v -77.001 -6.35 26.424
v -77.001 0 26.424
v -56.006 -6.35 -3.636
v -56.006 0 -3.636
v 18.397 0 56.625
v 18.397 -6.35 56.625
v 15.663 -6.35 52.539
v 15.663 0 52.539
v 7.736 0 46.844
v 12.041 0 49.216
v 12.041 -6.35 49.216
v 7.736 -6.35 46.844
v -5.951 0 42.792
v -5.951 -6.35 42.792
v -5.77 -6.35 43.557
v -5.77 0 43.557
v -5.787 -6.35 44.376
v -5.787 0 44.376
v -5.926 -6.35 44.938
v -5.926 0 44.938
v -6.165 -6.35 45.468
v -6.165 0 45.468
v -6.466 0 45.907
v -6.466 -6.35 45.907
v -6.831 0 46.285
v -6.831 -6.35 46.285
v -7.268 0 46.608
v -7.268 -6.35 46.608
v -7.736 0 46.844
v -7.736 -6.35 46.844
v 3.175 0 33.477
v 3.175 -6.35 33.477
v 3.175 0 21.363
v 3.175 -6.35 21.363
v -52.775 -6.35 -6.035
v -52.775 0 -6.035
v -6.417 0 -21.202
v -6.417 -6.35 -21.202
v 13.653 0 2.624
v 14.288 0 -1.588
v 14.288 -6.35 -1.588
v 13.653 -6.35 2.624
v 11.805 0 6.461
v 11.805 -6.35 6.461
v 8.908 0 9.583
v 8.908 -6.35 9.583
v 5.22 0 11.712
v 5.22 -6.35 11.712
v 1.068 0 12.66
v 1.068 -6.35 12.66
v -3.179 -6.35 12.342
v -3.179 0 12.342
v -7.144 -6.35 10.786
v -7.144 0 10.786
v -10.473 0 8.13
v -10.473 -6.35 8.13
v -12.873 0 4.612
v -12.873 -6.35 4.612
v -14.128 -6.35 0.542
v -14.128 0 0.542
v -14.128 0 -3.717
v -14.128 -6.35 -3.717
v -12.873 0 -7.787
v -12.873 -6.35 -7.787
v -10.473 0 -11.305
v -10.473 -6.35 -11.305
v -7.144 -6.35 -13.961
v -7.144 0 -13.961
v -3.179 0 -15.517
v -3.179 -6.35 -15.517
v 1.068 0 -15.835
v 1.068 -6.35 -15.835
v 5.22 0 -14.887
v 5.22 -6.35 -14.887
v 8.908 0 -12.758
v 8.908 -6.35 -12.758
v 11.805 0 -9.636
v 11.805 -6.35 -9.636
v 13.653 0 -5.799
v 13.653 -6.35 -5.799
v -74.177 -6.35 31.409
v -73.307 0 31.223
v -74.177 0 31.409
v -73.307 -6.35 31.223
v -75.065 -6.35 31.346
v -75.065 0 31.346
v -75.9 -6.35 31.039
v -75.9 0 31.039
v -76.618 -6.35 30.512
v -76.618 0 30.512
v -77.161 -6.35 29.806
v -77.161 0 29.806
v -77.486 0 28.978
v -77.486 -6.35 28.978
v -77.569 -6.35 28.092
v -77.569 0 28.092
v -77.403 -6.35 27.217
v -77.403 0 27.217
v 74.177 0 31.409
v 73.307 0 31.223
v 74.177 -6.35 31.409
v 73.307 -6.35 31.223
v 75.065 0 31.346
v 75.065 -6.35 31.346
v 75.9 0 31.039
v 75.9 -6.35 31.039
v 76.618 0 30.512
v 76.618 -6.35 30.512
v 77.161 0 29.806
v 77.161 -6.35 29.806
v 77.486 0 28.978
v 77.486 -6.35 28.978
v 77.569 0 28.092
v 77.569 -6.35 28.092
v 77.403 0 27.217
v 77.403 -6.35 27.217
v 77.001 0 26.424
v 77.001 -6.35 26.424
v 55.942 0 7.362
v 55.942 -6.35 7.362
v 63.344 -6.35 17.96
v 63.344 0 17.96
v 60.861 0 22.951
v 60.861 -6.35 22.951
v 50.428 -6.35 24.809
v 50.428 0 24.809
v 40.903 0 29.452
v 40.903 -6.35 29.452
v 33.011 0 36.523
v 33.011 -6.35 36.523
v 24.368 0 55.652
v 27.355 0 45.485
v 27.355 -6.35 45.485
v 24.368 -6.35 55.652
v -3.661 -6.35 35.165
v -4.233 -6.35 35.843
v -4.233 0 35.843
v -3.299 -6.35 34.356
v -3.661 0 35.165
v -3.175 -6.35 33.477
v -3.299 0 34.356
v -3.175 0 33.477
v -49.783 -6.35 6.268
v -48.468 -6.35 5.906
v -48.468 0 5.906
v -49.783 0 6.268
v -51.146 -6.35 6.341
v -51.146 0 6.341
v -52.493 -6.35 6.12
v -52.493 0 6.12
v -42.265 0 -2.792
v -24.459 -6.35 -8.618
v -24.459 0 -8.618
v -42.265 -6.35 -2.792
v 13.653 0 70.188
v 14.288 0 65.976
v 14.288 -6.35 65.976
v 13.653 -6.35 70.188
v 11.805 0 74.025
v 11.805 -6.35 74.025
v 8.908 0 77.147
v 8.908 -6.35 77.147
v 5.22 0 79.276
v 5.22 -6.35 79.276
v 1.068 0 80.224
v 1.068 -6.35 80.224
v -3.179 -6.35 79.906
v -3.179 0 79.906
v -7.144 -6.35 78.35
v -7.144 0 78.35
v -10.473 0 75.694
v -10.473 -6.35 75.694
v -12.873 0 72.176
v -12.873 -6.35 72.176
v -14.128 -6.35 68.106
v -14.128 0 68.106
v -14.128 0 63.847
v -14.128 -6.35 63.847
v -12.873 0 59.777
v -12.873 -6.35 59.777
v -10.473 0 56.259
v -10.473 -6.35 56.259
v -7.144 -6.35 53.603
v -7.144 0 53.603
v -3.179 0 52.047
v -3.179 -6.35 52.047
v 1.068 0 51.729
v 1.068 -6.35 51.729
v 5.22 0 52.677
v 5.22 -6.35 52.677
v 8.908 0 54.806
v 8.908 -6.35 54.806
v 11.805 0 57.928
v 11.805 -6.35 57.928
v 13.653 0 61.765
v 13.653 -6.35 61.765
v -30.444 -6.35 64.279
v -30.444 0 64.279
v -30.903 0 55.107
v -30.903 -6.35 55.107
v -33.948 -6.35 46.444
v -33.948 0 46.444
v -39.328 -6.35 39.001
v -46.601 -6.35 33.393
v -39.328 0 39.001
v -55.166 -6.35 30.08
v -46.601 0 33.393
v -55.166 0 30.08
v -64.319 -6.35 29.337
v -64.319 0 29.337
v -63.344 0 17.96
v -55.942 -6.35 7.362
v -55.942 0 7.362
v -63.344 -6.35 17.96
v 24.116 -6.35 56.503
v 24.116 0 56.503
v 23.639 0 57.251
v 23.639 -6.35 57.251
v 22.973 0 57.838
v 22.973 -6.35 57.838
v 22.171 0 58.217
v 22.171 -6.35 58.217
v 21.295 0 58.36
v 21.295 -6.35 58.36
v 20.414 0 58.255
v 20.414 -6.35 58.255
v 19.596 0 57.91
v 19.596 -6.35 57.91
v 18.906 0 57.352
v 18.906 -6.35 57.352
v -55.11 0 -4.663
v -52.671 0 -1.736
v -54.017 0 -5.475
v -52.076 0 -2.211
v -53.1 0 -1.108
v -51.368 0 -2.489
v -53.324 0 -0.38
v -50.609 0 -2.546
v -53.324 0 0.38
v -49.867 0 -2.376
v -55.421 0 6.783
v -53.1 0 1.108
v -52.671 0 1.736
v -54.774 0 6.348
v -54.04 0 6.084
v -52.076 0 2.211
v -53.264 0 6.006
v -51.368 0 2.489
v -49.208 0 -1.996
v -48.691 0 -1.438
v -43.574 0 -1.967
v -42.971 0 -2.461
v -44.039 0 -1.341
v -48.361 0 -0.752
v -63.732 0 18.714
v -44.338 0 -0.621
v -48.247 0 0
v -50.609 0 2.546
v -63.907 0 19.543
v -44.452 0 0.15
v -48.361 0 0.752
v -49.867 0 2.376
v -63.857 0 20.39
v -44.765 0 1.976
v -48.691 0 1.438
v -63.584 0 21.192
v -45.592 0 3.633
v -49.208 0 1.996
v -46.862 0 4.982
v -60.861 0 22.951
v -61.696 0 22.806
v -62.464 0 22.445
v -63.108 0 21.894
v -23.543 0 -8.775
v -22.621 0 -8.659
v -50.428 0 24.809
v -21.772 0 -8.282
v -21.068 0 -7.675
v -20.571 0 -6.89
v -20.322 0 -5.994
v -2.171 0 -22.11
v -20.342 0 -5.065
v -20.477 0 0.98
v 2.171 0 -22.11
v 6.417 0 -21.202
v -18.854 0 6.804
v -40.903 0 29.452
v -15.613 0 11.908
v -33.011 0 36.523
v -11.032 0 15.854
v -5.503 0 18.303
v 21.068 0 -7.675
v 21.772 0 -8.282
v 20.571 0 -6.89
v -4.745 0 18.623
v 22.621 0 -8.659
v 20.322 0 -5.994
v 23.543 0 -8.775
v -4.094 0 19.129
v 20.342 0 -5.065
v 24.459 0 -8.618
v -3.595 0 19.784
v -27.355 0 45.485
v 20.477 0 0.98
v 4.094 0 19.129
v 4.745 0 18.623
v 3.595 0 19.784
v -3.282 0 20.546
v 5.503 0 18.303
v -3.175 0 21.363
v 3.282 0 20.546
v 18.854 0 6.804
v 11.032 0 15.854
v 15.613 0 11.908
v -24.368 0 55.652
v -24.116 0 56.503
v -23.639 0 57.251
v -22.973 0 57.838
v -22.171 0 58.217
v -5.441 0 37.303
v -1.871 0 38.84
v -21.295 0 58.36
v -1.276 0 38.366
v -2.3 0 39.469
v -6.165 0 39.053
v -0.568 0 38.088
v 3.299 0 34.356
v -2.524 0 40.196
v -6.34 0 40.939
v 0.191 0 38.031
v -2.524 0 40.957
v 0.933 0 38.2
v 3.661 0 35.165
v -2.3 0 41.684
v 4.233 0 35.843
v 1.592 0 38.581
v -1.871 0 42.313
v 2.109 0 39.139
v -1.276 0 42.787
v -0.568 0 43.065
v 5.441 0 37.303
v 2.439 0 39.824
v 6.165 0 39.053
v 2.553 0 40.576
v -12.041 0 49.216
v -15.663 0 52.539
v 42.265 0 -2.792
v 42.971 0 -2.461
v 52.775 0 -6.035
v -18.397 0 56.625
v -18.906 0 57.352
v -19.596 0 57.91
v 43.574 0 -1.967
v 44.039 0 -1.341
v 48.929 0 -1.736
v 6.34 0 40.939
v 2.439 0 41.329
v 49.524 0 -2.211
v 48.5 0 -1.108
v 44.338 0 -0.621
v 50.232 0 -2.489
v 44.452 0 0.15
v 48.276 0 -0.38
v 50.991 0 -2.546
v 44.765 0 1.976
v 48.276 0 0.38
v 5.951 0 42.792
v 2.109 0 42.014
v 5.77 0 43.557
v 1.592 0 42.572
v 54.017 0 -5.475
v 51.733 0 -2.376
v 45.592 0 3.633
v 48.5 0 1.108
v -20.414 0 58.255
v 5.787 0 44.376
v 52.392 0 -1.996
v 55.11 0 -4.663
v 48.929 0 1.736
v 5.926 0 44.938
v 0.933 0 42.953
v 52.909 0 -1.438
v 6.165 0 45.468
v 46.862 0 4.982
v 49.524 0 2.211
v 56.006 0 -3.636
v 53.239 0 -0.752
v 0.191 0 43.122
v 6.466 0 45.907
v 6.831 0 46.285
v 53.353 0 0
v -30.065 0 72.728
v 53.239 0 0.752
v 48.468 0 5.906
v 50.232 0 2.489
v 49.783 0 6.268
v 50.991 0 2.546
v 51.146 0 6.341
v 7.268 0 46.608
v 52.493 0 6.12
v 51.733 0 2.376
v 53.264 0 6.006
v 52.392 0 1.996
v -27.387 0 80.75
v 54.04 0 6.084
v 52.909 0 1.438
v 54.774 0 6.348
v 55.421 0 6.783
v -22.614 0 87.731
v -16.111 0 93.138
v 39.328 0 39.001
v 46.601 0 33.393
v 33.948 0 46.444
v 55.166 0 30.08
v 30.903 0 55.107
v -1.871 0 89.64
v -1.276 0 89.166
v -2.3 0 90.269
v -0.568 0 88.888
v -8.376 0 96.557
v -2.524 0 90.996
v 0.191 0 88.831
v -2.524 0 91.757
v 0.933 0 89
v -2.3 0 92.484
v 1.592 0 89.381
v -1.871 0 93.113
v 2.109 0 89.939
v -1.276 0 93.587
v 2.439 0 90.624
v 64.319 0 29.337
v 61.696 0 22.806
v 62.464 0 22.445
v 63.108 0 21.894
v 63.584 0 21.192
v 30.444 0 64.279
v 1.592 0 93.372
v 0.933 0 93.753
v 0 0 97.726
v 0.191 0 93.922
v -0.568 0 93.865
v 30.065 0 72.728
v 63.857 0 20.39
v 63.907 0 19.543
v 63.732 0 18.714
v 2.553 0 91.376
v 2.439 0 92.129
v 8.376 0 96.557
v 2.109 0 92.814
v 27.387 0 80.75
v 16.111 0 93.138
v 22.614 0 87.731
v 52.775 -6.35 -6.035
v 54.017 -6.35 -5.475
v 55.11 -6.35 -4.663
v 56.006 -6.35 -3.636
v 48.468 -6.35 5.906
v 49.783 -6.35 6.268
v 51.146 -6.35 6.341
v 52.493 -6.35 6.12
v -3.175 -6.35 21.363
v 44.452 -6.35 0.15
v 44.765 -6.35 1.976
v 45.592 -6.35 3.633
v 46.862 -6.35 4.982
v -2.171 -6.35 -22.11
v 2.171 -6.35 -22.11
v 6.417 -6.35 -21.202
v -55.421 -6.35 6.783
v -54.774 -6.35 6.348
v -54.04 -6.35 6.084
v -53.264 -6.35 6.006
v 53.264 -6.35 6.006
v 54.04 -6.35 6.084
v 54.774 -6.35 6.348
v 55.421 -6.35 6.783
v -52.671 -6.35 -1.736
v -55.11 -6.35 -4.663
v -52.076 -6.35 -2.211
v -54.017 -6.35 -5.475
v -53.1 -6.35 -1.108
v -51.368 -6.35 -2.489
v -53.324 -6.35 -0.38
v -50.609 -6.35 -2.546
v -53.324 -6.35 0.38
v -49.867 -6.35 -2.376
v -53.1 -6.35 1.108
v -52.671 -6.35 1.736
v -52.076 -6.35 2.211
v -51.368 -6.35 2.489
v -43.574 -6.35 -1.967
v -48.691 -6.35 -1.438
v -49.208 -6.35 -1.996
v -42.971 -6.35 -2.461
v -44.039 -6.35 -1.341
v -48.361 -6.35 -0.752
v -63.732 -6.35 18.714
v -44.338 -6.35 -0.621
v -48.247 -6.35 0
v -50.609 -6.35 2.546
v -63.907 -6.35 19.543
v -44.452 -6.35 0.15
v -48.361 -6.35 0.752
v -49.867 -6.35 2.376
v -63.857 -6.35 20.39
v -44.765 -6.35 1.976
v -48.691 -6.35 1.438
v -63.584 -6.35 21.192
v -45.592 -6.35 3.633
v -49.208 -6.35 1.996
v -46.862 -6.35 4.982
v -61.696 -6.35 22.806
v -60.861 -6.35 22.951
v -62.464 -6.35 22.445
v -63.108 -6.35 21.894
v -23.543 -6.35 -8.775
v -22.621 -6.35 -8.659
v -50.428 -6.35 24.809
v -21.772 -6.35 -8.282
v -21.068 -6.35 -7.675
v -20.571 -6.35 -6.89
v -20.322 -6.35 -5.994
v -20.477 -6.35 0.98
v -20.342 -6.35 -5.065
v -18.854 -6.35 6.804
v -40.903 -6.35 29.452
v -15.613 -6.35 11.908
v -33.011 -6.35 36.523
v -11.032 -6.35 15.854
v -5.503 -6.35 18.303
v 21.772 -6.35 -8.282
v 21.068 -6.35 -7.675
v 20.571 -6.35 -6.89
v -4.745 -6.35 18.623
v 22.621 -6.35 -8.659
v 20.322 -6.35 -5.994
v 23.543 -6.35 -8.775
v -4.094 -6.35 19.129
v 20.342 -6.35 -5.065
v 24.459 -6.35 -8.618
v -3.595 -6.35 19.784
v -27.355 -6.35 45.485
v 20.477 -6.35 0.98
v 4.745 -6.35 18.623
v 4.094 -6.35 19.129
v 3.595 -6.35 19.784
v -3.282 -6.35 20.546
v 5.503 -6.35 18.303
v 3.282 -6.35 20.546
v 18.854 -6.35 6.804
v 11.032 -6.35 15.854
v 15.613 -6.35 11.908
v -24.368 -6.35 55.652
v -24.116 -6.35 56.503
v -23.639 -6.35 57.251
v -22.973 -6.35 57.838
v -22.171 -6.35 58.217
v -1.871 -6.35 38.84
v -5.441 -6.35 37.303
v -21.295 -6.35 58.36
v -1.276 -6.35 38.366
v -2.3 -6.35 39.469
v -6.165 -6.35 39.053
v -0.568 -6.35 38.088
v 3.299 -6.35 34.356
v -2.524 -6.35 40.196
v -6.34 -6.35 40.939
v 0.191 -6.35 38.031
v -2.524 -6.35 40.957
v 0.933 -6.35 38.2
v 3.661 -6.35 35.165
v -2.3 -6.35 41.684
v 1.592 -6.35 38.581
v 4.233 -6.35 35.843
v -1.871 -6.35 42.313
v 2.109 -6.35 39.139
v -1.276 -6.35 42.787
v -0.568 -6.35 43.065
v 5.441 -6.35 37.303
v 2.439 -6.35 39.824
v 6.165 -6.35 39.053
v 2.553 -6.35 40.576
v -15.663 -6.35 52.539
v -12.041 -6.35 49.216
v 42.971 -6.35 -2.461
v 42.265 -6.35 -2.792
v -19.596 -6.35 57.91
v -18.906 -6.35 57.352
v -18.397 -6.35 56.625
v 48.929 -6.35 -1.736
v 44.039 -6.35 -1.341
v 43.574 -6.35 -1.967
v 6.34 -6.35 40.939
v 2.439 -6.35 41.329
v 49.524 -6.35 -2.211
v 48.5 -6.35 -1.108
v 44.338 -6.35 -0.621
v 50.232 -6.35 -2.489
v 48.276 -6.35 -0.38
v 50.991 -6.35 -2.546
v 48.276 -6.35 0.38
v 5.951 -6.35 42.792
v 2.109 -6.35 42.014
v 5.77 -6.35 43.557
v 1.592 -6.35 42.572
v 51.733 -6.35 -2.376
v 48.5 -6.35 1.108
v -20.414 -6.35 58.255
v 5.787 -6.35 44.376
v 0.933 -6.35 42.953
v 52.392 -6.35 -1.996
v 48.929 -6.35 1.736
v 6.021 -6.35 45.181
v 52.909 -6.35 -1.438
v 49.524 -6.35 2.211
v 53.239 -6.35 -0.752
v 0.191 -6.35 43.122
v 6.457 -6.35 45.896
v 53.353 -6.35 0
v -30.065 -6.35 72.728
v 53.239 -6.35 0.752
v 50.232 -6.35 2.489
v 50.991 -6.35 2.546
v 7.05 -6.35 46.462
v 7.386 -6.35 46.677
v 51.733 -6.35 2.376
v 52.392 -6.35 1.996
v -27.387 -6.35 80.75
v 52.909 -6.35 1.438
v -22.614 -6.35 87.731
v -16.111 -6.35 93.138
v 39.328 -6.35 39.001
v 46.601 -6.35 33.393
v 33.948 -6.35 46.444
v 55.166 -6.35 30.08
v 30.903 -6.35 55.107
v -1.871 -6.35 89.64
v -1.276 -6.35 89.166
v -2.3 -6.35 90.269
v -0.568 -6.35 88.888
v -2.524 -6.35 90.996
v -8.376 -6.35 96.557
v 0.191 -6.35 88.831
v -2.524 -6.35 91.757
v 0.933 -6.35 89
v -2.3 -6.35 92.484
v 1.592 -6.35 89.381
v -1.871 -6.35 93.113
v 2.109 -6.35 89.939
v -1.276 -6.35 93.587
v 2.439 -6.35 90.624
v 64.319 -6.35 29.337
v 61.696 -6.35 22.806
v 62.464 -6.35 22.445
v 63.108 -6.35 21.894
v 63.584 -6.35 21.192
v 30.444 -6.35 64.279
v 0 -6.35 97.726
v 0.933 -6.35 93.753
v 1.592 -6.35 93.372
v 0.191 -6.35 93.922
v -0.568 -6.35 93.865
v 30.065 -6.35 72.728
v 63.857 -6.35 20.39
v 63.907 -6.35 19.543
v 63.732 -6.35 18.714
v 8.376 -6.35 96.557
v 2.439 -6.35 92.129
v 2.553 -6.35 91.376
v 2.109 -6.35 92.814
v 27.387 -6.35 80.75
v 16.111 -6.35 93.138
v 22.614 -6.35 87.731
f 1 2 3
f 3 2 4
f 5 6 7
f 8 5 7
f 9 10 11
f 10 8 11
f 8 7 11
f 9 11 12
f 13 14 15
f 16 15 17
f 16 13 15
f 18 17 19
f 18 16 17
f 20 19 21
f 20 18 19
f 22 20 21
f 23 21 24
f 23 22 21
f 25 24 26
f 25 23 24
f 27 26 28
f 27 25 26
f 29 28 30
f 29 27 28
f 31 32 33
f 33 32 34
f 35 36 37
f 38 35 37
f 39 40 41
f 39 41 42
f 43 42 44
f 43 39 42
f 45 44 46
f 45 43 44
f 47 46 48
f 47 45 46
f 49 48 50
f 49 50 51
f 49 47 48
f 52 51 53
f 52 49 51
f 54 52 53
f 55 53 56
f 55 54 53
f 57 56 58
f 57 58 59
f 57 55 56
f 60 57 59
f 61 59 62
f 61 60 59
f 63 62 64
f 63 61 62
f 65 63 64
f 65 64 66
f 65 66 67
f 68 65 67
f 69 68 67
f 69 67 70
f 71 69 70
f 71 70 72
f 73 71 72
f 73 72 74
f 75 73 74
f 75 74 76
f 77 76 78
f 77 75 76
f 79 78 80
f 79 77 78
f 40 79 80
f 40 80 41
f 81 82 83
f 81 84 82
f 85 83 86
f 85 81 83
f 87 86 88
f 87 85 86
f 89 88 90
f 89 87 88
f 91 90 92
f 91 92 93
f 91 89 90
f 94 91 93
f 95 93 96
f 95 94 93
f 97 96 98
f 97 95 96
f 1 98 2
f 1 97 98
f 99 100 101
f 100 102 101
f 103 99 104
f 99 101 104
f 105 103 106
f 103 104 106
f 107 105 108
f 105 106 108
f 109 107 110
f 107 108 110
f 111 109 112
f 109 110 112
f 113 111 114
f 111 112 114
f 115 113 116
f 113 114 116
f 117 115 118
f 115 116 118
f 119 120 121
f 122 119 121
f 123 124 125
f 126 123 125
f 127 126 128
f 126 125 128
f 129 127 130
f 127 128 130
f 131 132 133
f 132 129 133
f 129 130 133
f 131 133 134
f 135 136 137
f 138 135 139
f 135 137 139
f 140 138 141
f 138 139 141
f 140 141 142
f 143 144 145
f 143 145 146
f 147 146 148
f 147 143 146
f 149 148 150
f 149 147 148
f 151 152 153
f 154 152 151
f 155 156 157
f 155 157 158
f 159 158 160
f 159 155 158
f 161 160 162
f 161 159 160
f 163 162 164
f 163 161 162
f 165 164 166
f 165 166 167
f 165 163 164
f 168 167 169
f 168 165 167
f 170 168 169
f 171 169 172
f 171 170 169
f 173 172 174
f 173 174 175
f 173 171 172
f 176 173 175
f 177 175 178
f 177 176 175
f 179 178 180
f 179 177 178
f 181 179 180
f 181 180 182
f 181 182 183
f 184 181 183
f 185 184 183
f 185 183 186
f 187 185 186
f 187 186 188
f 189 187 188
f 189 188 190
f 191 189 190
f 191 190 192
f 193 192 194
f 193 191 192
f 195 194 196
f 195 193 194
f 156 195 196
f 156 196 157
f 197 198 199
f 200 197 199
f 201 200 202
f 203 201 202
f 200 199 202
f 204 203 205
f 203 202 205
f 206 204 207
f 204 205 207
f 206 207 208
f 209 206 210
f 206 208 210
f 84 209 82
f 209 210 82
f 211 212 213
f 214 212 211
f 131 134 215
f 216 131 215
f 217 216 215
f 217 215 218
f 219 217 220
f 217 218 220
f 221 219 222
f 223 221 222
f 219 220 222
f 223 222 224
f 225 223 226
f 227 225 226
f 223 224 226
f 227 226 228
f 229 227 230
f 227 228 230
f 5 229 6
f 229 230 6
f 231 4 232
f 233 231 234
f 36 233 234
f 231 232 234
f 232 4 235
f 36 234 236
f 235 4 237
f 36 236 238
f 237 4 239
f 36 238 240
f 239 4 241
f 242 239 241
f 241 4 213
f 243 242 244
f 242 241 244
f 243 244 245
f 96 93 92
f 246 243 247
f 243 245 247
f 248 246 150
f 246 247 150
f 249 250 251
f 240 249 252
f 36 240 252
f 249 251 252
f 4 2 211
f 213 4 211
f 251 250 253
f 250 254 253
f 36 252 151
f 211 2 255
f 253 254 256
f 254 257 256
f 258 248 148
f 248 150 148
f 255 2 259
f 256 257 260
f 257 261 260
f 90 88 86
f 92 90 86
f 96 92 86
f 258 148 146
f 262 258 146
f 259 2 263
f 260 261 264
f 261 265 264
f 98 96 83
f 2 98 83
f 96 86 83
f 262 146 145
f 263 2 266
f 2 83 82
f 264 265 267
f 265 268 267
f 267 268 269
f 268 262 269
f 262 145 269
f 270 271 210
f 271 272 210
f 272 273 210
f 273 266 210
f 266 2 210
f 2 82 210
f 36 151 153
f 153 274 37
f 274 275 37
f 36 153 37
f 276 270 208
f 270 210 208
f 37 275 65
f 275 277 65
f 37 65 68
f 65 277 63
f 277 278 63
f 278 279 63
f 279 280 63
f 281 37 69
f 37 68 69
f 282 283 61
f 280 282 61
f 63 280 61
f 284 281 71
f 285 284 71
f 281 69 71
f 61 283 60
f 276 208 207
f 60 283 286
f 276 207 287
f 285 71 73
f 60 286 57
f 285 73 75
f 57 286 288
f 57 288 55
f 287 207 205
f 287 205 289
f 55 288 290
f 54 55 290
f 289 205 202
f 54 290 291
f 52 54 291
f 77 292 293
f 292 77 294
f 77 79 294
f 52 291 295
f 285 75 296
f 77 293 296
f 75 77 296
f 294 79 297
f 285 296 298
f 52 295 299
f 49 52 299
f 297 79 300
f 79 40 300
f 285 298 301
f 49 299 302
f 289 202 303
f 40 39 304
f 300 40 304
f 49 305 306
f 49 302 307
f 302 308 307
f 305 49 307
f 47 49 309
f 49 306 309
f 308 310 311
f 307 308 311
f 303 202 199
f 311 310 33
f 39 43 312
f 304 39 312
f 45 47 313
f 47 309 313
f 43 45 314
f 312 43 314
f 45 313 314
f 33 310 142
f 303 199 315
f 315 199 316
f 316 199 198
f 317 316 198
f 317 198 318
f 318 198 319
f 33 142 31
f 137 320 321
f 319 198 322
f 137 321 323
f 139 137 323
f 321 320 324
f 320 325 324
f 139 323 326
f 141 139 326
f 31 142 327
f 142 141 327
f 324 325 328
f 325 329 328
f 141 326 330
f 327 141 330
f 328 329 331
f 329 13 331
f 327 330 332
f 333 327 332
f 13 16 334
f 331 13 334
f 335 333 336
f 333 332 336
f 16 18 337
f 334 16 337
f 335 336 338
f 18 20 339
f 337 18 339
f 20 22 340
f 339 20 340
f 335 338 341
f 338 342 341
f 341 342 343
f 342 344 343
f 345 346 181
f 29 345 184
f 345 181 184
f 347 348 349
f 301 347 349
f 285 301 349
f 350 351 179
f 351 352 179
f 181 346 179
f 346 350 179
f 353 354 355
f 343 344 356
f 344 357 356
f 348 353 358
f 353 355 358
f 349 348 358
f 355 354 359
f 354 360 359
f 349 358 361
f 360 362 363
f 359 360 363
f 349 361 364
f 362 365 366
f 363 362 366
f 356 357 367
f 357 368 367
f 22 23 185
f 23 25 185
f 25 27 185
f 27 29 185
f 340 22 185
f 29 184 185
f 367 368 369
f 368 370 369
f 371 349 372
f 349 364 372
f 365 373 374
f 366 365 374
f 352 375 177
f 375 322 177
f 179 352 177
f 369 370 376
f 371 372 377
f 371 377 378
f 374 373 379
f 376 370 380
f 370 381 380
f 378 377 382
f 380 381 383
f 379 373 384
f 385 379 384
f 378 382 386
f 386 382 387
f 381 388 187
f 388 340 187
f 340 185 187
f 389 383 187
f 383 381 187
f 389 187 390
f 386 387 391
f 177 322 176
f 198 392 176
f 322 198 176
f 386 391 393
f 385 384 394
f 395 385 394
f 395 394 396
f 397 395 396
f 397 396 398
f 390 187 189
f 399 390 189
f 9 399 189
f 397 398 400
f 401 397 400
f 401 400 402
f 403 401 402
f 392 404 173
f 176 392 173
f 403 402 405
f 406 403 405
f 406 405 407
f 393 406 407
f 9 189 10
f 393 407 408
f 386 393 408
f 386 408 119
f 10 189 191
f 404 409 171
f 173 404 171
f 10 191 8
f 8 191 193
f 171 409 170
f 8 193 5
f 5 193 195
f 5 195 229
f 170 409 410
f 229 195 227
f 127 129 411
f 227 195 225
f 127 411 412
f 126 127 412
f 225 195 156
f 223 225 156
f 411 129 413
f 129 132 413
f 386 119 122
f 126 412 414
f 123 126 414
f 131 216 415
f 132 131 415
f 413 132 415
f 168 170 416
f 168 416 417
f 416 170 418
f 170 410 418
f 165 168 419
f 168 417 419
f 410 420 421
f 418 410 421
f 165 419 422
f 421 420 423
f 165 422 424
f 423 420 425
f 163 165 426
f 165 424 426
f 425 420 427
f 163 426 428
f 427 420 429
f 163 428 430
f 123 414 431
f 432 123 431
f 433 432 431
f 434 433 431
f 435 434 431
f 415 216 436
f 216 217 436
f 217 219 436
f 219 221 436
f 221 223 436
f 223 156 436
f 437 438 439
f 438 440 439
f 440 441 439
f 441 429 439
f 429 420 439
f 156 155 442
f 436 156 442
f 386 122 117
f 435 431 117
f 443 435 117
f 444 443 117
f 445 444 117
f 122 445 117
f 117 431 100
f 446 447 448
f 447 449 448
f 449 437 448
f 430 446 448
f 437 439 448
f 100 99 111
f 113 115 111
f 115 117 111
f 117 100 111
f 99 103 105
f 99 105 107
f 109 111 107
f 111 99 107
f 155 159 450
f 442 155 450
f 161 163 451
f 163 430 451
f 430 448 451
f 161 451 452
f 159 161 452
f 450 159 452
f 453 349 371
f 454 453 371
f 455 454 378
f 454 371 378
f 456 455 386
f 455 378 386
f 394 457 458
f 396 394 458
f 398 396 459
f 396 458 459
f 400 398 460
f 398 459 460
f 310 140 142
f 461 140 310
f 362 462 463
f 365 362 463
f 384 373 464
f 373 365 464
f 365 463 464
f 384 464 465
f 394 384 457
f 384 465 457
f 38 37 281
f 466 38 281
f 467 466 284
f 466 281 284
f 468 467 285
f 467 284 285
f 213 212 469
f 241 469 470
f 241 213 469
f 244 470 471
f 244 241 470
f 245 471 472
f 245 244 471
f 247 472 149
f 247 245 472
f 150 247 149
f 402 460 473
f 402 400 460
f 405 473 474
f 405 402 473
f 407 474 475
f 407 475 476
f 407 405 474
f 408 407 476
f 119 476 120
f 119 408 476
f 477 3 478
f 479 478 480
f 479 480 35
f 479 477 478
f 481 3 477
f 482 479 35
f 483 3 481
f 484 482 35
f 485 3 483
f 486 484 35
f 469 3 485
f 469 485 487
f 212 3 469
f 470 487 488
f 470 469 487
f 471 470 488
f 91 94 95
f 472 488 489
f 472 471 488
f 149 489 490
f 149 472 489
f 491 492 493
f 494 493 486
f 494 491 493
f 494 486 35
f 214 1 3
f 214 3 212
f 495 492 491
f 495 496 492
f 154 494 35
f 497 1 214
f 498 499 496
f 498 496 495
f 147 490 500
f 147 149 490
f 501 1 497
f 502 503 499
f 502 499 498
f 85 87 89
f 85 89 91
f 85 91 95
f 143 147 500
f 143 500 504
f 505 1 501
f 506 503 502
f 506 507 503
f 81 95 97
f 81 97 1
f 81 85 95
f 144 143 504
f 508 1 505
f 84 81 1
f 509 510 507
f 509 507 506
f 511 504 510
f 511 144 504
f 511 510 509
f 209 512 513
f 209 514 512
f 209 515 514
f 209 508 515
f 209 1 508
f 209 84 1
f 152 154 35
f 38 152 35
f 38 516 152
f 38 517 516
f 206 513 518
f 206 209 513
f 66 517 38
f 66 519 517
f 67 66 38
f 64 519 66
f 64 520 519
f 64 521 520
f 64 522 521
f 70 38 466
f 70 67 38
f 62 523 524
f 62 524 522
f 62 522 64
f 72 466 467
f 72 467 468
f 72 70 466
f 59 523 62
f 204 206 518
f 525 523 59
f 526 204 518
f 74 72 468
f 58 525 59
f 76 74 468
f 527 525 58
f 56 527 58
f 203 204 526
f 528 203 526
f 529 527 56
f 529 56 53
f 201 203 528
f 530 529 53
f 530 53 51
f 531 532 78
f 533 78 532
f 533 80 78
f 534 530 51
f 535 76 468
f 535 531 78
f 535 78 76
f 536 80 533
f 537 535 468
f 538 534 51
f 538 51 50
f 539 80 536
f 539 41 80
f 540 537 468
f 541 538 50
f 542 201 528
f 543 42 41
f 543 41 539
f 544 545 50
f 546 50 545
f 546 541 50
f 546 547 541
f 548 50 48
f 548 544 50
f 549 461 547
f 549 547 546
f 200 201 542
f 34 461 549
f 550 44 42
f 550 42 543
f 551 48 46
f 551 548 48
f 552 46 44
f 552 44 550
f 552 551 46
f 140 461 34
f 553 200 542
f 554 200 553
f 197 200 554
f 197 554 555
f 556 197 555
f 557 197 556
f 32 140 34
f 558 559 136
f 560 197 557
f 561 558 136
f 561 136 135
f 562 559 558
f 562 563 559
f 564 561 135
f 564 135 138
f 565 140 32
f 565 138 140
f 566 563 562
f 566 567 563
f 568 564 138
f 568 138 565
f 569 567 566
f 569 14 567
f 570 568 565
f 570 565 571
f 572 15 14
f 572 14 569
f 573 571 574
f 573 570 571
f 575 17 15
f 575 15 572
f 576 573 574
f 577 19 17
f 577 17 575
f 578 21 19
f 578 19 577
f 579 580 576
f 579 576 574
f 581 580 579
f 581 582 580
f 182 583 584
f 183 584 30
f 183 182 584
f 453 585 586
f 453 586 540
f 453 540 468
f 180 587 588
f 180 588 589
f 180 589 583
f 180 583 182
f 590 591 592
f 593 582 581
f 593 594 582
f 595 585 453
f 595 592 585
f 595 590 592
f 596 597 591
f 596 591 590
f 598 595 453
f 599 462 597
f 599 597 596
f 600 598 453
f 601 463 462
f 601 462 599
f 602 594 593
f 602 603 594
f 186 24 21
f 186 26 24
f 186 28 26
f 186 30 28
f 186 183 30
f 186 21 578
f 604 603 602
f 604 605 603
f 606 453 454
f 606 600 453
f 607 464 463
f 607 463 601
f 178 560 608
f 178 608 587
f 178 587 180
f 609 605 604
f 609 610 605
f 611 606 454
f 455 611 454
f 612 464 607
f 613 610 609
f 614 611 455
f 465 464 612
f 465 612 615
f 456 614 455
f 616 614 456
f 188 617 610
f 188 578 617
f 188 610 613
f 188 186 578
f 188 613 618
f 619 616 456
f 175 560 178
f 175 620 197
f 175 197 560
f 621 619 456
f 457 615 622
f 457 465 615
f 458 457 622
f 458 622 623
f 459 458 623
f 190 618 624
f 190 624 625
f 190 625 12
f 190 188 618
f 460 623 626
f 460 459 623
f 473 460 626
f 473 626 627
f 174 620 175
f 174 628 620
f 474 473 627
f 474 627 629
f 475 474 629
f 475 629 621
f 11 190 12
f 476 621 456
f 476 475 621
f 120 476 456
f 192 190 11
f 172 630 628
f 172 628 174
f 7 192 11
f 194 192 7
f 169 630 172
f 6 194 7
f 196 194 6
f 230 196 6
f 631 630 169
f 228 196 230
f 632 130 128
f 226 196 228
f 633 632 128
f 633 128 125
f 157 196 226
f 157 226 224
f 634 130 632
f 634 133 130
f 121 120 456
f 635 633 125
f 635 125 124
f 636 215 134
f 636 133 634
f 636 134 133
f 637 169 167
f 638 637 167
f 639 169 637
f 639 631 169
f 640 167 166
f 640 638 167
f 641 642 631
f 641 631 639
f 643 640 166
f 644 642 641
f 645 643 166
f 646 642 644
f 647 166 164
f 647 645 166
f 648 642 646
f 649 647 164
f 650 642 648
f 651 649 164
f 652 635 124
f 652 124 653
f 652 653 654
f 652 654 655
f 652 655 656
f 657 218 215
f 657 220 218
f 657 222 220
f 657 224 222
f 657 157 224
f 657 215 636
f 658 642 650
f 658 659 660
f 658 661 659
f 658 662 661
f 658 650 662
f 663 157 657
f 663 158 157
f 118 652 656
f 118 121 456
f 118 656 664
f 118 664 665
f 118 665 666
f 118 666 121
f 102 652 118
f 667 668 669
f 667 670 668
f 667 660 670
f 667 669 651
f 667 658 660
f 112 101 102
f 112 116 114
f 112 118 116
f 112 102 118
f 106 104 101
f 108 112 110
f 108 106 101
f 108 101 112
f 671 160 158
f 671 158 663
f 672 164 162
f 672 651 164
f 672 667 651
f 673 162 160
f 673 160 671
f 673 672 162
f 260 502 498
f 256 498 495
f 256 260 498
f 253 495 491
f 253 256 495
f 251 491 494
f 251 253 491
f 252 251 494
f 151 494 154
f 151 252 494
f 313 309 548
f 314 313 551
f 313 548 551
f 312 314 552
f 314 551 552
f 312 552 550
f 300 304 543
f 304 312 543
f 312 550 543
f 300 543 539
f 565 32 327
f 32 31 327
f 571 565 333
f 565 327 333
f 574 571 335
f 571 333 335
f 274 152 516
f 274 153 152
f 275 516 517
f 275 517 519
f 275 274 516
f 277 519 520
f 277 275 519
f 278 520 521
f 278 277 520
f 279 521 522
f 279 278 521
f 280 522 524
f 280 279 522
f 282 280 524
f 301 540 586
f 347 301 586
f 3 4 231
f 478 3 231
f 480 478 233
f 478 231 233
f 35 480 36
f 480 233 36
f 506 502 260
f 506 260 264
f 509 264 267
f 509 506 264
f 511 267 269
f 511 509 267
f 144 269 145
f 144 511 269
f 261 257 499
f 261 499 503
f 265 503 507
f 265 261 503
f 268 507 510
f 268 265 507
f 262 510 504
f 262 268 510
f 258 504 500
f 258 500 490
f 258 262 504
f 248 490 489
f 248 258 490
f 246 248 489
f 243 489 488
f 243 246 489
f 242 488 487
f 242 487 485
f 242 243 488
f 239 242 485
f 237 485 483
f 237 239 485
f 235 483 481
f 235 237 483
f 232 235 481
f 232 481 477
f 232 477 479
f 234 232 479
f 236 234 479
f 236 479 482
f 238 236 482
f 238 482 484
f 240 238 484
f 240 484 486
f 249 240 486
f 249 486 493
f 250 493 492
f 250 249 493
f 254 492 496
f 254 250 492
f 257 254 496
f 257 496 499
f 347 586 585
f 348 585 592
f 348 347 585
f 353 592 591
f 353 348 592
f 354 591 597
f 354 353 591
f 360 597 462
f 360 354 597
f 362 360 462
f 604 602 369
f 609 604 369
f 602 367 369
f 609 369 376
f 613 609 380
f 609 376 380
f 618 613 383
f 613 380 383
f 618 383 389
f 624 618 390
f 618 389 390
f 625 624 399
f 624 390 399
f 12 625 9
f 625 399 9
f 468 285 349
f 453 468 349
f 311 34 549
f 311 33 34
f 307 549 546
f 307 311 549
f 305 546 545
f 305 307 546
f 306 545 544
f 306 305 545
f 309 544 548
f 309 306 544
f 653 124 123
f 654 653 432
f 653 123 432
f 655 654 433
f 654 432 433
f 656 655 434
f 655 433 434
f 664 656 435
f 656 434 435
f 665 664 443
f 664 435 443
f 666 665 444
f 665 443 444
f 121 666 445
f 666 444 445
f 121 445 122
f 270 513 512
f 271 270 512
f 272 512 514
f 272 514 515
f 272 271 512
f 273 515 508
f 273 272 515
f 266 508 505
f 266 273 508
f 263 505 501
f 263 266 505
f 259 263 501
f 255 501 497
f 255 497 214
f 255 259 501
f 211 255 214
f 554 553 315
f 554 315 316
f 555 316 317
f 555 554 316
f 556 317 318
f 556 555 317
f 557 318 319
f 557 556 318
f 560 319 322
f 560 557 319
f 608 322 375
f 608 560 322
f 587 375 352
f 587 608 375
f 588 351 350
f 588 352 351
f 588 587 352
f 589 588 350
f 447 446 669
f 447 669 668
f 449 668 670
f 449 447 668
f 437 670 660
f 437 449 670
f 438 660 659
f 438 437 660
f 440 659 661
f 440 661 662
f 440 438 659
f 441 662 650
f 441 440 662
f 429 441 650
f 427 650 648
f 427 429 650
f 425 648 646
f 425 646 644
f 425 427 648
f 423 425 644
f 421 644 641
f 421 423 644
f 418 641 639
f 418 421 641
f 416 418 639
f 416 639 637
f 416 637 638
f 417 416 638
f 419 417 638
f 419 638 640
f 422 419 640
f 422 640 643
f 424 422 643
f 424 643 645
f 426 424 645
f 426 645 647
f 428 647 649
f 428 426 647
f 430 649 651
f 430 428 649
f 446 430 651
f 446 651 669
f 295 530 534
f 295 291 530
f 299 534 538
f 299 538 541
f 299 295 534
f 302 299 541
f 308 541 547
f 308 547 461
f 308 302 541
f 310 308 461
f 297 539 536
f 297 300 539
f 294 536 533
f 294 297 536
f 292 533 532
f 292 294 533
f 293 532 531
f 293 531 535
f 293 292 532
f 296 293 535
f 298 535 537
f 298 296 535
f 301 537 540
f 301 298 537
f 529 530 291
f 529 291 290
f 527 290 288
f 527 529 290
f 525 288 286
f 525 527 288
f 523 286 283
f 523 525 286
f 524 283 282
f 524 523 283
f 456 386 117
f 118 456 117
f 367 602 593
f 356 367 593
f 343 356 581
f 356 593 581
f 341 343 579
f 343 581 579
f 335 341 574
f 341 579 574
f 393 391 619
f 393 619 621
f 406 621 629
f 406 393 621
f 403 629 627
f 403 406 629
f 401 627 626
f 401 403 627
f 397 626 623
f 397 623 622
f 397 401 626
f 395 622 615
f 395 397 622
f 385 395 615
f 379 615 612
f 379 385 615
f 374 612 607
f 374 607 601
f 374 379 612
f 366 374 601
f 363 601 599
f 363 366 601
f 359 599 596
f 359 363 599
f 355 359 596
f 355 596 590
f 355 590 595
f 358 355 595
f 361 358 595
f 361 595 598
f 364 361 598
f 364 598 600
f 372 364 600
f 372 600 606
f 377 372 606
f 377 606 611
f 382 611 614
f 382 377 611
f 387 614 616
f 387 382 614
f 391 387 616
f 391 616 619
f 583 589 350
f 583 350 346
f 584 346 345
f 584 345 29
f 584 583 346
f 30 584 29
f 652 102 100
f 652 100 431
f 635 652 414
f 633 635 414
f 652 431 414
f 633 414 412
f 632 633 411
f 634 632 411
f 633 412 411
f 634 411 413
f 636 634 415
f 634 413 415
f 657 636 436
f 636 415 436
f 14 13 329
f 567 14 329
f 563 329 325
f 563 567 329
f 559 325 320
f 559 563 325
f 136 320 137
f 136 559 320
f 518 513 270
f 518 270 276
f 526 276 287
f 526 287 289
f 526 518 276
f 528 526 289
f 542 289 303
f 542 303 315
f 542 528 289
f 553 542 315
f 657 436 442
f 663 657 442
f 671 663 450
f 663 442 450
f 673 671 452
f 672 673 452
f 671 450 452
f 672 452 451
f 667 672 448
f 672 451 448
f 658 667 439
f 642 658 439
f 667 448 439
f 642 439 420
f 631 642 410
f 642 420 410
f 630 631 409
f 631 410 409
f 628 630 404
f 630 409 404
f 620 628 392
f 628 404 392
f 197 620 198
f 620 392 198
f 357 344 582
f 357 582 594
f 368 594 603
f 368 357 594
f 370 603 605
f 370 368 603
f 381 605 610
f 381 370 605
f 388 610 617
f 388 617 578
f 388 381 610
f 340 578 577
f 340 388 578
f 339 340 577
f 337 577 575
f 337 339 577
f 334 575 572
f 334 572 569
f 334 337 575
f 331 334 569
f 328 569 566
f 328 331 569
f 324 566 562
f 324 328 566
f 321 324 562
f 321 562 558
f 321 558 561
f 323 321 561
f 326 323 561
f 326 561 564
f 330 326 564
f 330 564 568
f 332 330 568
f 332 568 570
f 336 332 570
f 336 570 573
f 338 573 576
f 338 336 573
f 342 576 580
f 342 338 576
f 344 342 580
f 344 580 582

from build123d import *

# Parameters (mm, degrees)
F0_R     = 2.5527
F0_R_2   = 14.2875
F1_DEPTH = 6.35
F2_F1_R  = 3.175
F2_F2_R  = 3.175
F4_DEPTH = 25.4
F5_R     = 3.175


# Not quite as in the source:
# - a pattern or mirror of a feature is missing from the dataset's text; its kind, count and spacing are read off the source's solid


with BuildPart() as f1:
    # F0 (on Front) → F1 (new body)
    with BuildSketch(Plane.XZ):
        with BuildLine():
            ThreePointArc((-30.44415143, 64.2793510436), (-51.27863842, 31.2336995415), (-88.5449286211, 42.9518284873))
            Line((-88.5449286211, 42.9518284873), (-56.0059264265, -3.6360459351))
            ThreePointArc((-56.0059264265, -3.6360459351), (-54.5853345088, -5.0984058937), (-52.7745376605, -6.0352051355))
            Line((-52.7745376605, -6.0352051355), (-6.4172473966, -21.2019166903))
            ThreePointArc((-6.4172473966, -21.2019166903), (0, -22.225), (6.4172473966, -21.2019166903))
            Line((6.4172473966, -21.2019166903), (52.7745376605, -6.0352051355))
            ThreePointArc((52.7745376605, -6.0352051355), (54.5853345088, -5.0984058937), (56.0059264265, -3.6360459351))
            Line((56.0059264265, -3.6360459351), (88.5449286211, 42.9518284873))
            ThreePointArc((88.5449286211, 42.9518284873), (51.27863842, 31.2336995415), (30.44415143, 64.2793510436))
            ThreePointArc((30.44415143, 64.2793510436), (0, 97.7265), (-30.44415143, 64.2793510436))
        make_face()
        with Locations((-50.8, 0)):
            Circle(F0_R, mode=Mode.SUBTRACT)
        with Locations((0, -1.5875)):
            Circle(F0_R_2, mode=Mode.SUBTRACT)
        with Locations((50.8, 0)):
            Circle(F0_R, mode=Mode.SUBTRACT)
        with Locations((0, 40.5765)):
            Circle(F0_R, mode=Mode.SUBTRACT)
        with Locations((0, 65.9765)):
            Circle(F0_R_2, mode=Mode.SUBTRACT)
        with Locations((0, 91.3765)):
            Circle(F0_R, mode=Mode.SUBTRACT)
    extrude(amount=F1_DEPTH)

    # F2: fillet of radius 3.175 on 2 edges, made by hand

    # F2_f1
    f2_f1_edges = [f1.edges().sort_by_distance(p)[0] for p in [
        (-88.5449286211, -3.175, 42.9518284873),
    ]]
    fillet(f2_f1_edges, radius=F2_F1_R)

    # F2_f2
    f2_f2_edges = [f1.edges().sort_by_distance(p)[0] for p in [
        (88.5449286211, -3.175, 42.9518284873),
    ]]
    fillet(f2_f2_edges, radius=F2_F2_R)

    # F3 (on face) → F4 (cut)
    with BuildSketch(Plane.XZ.offset(6.35)):
        with BuildLine():
            Line((3.175, 35.0772394145), (3.175, 18.8043067186))
            ThreePointArc((3.175, 18.8043067186), (18.2678223179, 8.0142224503), (18.5965200171, -10.5360110216))
            Line((18.5965200171, -10.5360110216), (44.7647958403, -1.9745379709))
            ThreePointArc((44.7647958403, -1.9745379709), (45.0527871506, 2.7003757871), (48.4675934129, 5.9061293383))
            ThreePointArc((48.4675934129, 5.9061293383), (51.5398921213, 6.306746055), (54.4360459499, 5.2059254026))
            Line((54.4360459499, 5.2059254026), (67.0131976966, 23.2133234987))
            ThreePointArc((67.0131976966, 23.2133234987), (39.0870703991, 30.7510953733), (24.3679226321, 55.6515628324))
            ThreePointArc((24.3679226321, 55.6515628324), (21.7379294481, 58.3195031239), (18.3969634882, 56.6245942764))
            ThreePointArc((18.3969634882, 56.6245942764), (12.3594159846, 49.4492121774), (3.7699852595, 45.6862654673))
            ThreePointArc((3.7699852595, 45.6862654673), (6.3400365543, 40.2209321773), (3.175, 35.0772394145))
        make_face()
    f4 = extrude(amount=-F4_DEPTH, mode=Mode.SUBTRACT)

    # F4_copies: F4 across plane
    add(f4.mirror(Plane(origin=(0, 0, 0), x_dir=(0, 0, -1), z_dir=(-1, 0, 0))), mode=Mode.SUBTRACT)

    # F5
    f5_edges = [f1.edges().sort_by_distance(p)[0] for p in [
        (3.769985, -3.175, 45.686265),
        (3.175, -3.175, 35.077239),
        (3.175, -3.175, 18.804307),
        (18.59652, -3.175, -10.536011),
        (44.764796, -3.175, -1.974538),
        (54.436046, -3.175, 5.205925),
        (67.013198, -3.175, 23.213323),
        (-3.769985, -3.175, 45.686265),
        (-67.013198, -3.175, 23.213323),
        (-54.436046, -3.175, 5.205925),
        (-44.764796, -3.175, -1.974538),
        (-18.59652, -3.175, -10.536011),
        (-3.175, -3.175, 18.804307),
        (-3.175, -3.175, 35.077239),
    ]]
    fillet(f5_edges, radius=F5_R)


solid = f1.part
